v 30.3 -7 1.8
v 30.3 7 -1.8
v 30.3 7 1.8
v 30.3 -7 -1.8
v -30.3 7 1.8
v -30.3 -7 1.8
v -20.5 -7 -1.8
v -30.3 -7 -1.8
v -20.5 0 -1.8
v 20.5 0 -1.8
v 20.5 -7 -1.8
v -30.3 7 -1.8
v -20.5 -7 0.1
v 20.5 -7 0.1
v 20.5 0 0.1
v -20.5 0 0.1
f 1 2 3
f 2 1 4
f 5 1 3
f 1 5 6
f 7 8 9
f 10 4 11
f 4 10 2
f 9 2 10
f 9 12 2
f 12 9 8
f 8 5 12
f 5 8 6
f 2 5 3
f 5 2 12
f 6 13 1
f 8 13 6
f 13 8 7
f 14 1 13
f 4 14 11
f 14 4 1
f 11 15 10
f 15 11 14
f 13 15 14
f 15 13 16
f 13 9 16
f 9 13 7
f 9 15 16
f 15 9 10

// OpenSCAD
difference()
{
  cube([60.6, 14, 3.6], center = true);
  translate([0, -4, -1.9])
  cube([41, 8, 4], center = true);
}
